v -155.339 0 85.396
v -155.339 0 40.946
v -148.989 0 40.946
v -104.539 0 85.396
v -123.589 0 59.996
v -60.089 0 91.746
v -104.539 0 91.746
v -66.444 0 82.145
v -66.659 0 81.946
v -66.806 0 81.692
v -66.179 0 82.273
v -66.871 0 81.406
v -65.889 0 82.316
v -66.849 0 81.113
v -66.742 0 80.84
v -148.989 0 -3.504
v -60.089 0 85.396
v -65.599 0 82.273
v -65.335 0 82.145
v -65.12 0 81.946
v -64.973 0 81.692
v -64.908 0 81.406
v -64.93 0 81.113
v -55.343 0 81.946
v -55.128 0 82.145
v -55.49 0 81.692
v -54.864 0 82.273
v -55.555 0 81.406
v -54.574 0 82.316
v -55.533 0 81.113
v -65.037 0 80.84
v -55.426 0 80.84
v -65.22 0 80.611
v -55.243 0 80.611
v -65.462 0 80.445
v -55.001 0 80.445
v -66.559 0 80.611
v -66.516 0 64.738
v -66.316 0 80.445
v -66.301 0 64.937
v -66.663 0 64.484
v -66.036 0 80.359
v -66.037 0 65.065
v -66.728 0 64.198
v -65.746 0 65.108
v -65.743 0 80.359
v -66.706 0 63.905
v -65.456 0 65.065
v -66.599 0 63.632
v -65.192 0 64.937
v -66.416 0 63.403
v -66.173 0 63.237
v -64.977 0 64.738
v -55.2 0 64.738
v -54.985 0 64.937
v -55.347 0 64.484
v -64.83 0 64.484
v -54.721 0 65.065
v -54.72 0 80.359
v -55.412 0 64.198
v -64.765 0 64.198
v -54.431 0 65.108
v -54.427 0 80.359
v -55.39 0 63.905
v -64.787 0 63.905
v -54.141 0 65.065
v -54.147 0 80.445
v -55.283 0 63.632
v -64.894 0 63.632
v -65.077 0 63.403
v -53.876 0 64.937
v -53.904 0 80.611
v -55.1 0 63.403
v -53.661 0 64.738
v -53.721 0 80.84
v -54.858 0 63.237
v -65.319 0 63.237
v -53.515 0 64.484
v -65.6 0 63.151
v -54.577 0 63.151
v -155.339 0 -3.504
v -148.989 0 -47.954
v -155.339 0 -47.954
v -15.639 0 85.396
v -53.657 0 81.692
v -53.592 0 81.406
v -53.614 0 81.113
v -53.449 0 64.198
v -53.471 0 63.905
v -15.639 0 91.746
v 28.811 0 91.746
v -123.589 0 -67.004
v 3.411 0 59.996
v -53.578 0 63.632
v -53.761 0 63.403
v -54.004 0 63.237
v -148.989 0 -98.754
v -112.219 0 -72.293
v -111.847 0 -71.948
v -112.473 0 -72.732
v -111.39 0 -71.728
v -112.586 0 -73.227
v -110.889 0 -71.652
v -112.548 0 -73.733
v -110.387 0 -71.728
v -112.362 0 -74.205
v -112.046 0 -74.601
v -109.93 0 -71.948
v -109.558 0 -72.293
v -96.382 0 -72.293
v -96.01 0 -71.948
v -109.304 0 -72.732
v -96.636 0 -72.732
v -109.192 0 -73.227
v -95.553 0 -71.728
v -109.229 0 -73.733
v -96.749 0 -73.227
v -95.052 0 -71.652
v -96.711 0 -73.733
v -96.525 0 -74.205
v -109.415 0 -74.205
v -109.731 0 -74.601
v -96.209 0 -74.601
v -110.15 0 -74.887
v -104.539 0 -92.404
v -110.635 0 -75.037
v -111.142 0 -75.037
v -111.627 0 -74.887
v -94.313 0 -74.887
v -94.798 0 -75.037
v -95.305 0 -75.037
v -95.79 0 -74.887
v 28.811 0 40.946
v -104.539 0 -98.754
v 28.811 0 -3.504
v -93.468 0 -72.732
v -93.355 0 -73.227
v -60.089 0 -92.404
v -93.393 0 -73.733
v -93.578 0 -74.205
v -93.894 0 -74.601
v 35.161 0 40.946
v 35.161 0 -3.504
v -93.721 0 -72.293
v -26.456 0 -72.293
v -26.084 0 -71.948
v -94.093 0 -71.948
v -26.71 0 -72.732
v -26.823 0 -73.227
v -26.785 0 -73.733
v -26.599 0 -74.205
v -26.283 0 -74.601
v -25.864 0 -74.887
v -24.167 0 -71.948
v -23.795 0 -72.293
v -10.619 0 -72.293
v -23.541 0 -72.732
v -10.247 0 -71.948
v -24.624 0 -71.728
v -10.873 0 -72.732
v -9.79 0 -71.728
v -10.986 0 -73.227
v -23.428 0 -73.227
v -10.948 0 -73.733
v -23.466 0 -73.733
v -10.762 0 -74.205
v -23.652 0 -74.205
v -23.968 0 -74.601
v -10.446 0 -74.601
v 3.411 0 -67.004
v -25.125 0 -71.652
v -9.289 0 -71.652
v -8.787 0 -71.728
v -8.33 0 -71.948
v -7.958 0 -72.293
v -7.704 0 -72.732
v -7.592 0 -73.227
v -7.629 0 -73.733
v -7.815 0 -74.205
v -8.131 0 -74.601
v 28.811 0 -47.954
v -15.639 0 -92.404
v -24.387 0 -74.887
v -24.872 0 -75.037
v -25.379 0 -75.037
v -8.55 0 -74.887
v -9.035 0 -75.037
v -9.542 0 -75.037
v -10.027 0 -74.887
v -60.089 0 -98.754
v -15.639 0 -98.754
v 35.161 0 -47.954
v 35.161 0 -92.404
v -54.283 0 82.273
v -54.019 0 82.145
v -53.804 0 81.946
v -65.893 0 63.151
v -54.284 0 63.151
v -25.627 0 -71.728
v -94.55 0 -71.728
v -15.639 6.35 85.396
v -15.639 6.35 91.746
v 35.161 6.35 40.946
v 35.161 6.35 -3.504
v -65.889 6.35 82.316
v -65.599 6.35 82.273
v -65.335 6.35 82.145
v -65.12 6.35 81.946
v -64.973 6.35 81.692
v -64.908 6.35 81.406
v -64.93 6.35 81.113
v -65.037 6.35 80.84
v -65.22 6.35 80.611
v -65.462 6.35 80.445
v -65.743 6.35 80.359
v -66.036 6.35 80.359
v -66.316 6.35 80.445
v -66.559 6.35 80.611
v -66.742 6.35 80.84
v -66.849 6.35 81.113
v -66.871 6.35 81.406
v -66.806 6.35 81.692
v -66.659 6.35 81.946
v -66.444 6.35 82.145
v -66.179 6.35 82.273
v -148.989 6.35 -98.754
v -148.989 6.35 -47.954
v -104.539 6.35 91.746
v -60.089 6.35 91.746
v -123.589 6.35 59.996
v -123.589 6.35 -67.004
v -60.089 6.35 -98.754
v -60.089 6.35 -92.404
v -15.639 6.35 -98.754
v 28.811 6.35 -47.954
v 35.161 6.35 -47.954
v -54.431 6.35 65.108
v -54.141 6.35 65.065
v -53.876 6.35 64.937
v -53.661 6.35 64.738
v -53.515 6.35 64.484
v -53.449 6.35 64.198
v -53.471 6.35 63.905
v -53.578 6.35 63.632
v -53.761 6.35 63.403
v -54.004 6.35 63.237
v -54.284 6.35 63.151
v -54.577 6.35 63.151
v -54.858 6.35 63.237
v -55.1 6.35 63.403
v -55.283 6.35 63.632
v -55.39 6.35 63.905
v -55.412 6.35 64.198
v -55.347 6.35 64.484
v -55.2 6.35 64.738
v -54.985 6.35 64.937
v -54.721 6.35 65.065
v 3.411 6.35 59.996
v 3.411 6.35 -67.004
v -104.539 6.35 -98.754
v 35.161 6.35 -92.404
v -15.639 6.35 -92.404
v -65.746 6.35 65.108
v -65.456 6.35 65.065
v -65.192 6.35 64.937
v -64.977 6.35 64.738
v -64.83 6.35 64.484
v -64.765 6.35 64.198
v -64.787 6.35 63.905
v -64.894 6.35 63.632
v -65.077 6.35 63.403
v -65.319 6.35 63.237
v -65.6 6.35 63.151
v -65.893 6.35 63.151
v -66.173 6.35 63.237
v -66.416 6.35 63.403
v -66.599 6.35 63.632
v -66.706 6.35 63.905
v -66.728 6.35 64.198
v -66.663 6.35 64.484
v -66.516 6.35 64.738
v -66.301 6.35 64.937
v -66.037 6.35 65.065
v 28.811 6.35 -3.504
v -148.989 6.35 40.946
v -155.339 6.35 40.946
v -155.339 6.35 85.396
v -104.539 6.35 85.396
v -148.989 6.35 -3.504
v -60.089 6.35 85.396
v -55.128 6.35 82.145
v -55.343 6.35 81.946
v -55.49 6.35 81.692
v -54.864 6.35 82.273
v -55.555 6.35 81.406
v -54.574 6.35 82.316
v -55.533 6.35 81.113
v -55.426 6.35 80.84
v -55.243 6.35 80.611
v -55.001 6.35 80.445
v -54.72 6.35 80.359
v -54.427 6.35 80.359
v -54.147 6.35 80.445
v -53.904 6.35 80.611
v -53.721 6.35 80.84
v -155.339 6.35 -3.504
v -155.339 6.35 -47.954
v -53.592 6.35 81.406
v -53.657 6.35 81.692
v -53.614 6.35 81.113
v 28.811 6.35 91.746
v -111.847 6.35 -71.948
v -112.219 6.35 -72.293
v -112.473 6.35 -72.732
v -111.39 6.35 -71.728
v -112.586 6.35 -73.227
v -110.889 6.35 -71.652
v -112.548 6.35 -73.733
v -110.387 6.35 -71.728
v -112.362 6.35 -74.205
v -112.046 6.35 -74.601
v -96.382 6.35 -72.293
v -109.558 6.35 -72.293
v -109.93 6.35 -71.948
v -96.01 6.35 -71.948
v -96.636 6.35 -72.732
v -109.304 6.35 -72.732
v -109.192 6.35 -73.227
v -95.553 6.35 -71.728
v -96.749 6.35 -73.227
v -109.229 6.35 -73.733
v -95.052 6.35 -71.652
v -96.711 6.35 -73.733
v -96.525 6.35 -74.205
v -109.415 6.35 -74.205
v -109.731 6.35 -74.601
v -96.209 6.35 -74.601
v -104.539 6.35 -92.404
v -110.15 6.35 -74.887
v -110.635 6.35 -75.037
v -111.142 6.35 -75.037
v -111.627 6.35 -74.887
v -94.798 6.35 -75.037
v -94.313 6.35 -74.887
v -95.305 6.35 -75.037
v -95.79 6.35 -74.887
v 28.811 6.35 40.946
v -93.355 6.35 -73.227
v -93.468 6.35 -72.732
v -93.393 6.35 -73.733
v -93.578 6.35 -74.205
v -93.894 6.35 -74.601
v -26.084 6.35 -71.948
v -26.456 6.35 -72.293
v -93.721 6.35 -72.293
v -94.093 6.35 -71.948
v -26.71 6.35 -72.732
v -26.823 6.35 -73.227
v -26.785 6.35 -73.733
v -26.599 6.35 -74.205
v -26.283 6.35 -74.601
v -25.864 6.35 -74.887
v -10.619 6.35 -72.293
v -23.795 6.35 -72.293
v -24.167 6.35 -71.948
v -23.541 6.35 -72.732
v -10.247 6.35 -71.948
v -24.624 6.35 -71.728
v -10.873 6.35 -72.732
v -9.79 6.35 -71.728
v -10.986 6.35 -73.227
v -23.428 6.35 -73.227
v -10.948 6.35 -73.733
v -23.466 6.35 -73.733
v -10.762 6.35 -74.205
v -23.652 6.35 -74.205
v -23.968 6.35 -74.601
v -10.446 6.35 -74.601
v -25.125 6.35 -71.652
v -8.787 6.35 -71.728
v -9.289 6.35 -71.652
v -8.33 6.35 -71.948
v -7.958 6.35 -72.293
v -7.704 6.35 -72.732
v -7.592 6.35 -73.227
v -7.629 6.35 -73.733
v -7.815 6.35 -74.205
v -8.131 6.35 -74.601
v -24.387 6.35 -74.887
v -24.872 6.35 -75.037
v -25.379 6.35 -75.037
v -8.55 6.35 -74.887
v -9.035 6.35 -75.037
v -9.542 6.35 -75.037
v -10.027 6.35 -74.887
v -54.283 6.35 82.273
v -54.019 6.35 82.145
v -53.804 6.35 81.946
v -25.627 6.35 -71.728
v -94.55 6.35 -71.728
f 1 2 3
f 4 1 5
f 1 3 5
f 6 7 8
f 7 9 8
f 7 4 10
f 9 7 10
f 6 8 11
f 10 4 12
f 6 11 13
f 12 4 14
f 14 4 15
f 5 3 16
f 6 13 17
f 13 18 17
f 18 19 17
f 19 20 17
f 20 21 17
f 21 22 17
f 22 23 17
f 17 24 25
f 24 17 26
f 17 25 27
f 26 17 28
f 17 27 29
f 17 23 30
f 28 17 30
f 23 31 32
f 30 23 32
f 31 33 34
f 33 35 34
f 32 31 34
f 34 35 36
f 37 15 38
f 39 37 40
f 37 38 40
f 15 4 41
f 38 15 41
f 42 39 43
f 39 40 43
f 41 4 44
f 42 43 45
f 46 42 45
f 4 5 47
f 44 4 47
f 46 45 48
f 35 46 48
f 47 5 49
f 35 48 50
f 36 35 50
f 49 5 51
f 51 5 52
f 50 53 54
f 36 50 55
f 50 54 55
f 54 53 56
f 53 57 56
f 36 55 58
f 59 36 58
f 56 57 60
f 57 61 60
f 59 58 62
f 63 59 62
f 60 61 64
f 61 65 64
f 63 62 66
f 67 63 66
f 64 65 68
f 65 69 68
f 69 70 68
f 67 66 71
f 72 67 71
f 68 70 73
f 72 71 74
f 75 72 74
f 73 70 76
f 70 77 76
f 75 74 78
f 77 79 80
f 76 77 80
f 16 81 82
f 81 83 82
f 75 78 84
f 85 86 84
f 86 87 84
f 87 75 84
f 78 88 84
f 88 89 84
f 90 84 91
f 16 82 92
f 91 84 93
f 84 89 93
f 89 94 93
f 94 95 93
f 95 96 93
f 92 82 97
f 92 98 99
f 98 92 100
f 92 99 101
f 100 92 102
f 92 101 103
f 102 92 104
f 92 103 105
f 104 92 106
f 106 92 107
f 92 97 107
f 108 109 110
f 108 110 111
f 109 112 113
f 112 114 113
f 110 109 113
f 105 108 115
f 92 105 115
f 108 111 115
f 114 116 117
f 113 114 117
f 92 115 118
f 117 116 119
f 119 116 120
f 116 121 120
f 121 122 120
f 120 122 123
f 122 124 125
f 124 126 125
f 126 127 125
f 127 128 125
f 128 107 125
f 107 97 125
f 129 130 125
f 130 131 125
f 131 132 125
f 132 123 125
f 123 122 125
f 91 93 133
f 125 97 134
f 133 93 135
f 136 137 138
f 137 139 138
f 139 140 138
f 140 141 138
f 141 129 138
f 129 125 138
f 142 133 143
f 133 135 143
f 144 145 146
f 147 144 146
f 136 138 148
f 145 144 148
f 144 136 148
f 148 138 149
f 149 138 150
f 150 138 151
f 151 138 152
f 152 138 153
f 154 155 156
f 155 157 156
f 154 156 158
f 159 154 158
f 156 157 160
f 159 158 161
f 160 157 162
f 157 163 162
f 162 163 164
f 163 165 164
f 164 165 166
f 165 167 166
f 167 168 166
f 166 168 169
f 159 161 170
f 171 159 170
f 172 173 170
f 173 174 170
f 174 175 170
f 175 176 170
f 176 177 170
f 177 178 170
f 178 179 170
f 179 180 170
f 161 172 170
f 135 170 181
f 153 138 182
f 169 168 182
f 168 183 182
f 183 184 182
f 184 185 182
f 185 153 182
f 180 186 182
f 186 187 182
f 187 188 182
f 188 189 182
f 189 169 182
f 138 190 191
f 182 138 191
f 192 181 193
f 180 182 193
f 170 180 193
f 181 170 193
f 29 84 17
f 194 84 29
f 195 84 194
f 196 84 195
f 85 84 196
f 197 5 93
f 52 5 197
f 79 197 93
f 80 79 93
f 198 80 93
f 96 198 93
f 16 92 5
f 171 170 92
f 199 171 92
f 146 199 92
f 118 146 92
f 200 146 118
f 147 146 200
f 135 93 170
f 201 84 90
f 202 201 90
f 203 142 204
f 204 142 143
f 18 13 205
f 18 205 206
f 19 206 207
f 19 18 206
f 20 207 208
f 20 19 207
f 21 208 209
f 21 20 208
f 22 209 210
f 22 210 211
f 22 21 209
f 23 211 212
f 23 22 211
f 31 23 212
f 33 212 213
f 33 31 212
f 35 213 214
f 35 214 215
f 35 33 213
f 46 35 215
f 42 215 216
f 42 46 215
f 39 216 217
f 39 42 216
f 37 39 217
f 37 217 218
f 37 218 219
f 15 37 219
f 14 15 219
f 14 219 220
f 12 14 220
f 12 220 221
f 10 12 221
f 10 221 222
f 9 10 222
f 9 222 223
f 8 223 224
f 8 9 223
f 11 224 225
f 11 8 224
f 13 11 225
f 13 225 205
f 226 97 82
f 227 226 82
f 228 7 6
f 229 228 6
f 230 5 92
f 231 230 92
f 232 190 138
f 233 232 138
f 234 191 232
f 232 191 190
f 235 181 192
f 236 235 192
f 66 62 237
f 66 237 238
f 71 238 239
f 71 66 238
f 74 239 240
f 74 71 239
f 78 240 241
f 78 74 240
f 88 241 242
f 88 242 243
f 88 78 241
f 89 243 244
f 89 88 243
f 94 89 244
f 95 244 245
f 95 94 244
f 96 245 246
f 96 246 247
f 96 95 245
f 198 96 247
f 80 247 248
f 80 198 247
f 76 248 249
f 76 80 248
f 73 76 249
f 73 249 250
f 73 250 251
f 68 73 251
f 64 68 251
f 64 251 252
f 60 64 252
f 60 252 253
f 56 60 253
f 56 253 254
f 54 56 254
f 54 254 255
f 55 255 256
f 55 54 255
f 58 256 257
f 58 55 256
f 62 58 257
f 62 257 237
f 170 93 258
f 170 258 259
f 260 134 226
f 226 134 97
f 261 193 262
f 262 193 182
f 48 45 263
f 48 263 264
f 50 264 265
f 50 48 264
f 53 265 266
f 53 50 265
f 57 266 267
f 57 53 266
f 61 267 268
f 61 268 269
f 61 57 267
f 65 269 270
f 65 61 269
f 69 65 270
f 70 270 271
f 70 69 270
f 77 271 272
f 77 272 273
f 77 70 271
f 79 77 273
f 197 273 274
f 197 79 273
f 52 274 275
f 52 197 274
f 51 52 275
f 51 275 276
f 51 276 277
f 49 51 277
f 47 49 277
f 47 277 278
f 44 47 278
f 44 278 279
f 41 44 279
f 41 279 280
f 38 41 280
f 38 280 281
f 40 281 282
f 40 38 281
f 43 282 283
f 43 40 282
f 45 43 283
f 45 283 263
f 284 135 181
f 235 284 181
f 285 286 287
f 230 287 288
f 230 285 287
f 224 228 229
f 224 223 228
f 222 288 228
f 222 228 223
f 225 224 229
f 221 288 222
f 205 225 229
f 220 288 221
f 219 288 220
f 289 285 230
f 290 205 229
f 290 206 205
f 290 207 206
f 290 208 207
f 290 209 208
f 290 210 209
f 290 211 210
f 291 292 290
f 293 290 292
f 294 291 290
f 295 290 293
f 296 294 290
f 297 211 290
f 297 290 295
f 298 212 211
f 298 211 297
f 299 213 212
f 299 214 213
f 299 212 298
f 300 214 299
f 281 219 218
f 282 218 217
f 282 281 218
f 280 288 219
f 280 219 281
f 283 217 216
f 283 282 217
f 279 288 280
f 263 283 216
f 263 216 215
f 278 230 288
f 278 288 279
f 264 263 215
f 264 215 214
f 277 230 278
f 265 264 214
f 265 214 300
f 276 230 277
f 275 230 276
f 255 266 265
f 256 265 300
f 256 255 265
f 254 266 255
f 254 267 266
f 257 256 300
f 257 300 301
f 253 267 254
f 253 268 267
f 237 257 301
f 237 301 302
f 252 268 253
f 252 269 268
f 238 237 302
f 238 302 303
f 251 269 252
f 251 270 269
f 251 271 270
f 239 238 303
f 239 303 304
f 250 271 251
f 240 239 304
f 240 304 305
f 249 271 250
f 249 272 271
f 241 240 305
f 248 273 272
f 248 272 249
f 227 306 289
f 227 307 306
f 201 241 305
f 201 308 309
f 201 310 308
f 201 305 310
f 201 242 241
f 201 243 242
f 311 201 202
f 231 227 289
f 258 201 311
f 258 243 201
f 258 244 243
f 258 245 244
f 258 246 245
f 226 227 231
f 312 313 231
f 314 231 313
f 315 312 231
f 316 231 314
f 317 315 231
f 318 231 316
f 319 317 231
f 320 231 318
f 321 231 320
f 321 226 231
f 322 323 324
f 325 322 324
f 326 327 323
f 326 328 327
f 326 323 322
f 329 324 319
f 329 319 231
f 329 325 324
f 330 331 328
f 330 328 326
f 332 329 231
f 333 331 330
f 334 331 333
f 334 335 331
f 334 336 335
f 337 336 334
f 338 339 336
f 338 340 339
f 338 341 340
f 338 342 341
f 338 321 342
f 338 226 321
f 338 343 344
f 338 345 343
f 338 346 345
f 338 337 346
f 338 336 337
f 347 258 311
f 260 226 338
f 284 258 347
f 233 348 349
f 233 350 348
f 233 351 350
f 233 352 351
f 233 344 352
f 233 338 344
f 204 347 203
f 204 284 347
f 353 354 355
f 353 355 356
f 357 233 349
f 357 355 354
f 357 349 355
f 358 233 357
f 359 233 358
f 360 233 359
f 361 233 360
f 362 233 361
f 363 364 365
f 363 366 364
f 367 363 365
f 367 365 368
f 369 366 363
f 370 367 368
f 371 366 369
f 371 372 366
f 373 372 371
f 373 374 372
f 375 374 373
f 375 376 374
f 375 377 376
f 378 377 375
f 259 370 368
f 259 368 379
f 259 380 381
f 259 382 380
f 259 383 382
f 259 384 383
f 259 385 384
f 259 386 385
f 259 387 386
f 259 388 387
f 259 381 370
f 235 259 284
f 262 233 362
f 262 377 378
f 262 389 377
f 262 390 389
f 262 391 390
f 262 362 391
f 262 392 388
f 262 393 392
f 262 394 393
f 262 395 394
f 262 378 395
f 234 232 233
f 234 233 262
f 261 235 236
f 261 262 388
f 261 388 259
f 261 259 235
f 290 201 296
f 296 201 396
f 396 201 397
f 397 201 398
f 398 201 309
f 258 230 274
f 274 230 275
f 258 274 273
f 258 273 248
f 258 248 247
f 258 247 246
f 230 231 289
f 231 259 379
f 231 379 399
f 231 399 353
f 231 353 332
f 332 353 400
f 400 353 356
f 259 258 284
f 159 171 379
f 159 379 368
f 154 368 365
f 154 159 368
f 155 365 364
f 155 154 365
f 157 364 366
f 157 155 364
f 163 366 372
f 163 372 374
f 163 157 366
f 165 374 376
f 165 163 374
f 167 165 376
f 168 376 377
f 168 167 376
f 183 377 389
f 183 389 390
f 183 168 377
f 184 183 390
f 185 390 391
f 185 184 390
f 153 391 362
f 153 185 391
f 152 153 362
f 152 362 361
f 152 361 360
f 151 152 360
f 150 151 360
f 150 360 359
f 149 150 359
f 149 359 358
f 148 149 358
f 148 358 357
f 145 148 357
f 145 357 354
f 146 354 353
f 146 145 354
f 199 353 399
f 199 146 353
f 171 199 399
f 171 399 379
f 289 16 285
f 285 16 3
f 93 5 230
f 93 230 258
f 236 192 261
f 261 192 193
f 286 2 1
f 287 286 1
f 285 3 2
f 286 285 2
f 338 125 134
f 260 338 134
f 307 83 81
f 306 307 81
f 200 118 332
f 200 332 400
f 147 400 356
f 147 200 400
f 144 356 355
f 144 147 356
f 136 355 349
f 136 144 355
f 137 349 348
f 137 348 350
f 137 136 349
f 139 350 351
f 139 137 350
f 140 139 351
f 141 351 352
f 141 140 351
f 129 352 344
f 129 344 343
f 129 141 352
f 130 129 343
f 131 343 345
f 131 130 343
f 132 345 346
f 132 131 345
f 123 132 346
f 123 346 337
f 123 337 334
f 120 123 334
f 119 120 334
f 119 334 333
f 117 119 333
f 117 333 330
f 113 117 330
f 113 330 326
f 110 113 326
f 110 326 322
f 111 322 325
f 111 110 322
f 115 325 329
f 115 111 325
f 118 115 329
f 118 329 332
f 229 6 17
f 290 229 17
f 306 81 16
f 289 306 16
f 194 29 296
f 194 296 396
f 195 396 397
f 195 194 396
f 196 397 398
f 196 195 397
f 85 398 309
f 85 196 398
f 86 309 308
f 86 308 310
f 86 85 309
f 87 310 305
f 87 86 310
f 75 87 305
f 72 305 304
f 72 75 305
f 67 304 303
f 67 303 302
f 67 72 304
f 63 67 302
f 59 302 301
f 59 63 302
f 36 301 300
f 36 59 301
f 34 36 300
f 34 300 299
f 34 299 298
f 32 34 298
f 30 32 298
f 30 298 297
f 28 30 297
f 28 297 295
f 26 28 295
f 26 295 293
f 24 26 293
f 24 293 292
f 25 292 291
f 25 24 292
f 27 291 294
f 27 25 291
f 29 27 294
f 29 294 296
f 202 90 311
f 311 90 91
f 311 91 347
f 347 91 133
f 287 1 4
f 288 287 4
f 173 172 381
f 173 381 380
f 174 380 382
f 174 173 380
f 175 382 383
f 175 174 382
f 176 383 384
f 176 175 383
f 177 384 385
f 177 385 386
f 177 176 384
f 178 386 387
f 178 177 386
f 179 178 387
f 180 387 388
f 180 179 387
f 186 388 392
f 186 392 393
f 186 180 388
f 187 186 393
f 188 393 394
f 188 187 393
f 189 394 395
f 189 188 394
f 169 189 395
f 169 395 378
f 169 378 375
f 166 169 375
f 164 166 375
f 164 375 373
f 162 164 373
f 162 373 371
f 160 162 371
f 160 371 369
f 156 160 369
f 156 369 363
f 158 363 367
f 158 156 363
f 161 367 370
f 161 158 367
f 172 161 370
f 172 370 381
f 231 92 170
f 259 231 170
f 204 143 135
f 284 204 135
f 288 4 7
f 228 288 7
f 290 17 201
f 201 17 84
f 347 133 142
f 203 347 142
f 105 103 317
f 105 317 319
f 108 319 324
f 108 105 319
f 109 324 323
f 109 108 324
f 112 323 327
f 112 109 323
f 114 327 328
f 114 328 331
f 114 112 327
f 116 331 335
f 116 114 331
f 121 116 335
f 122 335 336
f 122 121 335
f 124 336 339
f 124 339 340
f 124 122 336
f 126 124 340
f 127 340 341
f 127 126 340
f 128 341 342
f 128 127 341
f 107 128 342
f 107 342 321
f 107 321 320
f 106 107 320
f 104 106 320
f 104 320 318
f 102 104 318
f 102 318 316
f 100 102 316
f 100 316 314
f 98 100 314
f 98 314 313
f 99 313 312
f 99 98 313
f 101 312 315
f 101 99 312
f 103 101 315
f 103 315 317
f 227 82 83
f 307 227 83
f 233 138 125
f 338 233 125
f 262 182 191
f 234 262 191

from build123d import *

# Parameters (mm, degrees)
SKETCH1_R           = 1.7018
SKETCH1_R_2         = 0.98425
SKETCH1_W           = 127
SKETCH1_H           = 127
BOSS_EXTRUDE1_DEPTH = 6.35


with BuildPart() as part:
    # Sketch1 → Boss-Extrude1 (new body)
    with BuildSketch(Plane(origin=(0, 0, 0), x_dir=(1, 0, 0), z_dir=(0, 1, 0))):
        Polygon((-155.3385836, 3.503957448), (-148.9885836, 3.503957448), (-148.9885836, -40.946042552), (-155.3385836, -40.946042552), (-155.3385836, -85.396042552), (-104.5385836, -85.396042552), (-104.5385836, -91.746042552), (-60.0885836, -91.746042552), (-60.0885836, -85.396042552), (-15.6385836, -85.396042552), (-15.6385836, -91.746042552), (28.8114164, -91.746042552), (28.8114164, -40.946042552), (35.1614164, -40.946042552), (35.1614164, 3.503957448), (28.8114164, 3.503957448), (28.8114164, 47.953957448), (35.1614164, 47.953957448), (35.1614164, 92.403957448), (-15.6385836, 92.403957448), (-15.6385836, 98.753957448), (-60.0885836, 98.753957448), (-60.0885836, 92.403957448), (-104.5385836, 92.403957448), (-104.5385836, 98.753957448), (-148.9885836, 98.753957448), (-148.9885836, 47.953957448), (-155.3385836, 47.953957448), align=None)
        with Locations(Location((-9.2885836, 73.353957448, 0), (0, 0, 270))):
            Circle(SKETCH1_R, mode=Mode.SUBTRACT)
        with Locations(Location((-65.889299947, -81.332042552, 0), (0, 0, 270))):
            Circle(SKETCH1_R_2, mode=Mode.SUBTRACT)
        with Locations(Location((-65.7464336, -64.124135606, 0), (0, 0, 270))):
            Circle(SKETCH1_R_2, mode=Mode.SUBTRACT)
        with Locations(Location((-54.573599947, -81.332042552, 0), (0, 0, 270))):
            Circle(SKETCH1_R_2, mode=Mode.SUBTRACT)
        with Locations(Location((-54.4307336, -64.124135606, 0), (0, 0, 270))):
            Circle(SKETCH1_R_2, mode=Mode.SUBTRACT)
        with Locations((-60.0885836, 3.503957448)):
            Rectangle(SKETCH1_W, SKETCH1_H, mode=Mode.SUBTRACT)
        with Locations(Location((-110.8885836, 73.353957448, 0), (0, 0, 270))):
            Circle(SKETCH1_R, mode=Mode.SUBTRACT)
        with Locations(Location((-95.0516836, 73.353957448, 0), (0, 0, 270))):
            Circle(SKETCH1_R, mode=Mode.SUBTRACT)
        with Locations(Location((-25.1254836, 73.353957448, 0), (0, 0, 270))):
            Circle(SKETCH1_R, mode=Mode.SUBTRACT)
    extrude(amount=BOSS_EXTRUDE1_DEPTH)


solid = part.part
